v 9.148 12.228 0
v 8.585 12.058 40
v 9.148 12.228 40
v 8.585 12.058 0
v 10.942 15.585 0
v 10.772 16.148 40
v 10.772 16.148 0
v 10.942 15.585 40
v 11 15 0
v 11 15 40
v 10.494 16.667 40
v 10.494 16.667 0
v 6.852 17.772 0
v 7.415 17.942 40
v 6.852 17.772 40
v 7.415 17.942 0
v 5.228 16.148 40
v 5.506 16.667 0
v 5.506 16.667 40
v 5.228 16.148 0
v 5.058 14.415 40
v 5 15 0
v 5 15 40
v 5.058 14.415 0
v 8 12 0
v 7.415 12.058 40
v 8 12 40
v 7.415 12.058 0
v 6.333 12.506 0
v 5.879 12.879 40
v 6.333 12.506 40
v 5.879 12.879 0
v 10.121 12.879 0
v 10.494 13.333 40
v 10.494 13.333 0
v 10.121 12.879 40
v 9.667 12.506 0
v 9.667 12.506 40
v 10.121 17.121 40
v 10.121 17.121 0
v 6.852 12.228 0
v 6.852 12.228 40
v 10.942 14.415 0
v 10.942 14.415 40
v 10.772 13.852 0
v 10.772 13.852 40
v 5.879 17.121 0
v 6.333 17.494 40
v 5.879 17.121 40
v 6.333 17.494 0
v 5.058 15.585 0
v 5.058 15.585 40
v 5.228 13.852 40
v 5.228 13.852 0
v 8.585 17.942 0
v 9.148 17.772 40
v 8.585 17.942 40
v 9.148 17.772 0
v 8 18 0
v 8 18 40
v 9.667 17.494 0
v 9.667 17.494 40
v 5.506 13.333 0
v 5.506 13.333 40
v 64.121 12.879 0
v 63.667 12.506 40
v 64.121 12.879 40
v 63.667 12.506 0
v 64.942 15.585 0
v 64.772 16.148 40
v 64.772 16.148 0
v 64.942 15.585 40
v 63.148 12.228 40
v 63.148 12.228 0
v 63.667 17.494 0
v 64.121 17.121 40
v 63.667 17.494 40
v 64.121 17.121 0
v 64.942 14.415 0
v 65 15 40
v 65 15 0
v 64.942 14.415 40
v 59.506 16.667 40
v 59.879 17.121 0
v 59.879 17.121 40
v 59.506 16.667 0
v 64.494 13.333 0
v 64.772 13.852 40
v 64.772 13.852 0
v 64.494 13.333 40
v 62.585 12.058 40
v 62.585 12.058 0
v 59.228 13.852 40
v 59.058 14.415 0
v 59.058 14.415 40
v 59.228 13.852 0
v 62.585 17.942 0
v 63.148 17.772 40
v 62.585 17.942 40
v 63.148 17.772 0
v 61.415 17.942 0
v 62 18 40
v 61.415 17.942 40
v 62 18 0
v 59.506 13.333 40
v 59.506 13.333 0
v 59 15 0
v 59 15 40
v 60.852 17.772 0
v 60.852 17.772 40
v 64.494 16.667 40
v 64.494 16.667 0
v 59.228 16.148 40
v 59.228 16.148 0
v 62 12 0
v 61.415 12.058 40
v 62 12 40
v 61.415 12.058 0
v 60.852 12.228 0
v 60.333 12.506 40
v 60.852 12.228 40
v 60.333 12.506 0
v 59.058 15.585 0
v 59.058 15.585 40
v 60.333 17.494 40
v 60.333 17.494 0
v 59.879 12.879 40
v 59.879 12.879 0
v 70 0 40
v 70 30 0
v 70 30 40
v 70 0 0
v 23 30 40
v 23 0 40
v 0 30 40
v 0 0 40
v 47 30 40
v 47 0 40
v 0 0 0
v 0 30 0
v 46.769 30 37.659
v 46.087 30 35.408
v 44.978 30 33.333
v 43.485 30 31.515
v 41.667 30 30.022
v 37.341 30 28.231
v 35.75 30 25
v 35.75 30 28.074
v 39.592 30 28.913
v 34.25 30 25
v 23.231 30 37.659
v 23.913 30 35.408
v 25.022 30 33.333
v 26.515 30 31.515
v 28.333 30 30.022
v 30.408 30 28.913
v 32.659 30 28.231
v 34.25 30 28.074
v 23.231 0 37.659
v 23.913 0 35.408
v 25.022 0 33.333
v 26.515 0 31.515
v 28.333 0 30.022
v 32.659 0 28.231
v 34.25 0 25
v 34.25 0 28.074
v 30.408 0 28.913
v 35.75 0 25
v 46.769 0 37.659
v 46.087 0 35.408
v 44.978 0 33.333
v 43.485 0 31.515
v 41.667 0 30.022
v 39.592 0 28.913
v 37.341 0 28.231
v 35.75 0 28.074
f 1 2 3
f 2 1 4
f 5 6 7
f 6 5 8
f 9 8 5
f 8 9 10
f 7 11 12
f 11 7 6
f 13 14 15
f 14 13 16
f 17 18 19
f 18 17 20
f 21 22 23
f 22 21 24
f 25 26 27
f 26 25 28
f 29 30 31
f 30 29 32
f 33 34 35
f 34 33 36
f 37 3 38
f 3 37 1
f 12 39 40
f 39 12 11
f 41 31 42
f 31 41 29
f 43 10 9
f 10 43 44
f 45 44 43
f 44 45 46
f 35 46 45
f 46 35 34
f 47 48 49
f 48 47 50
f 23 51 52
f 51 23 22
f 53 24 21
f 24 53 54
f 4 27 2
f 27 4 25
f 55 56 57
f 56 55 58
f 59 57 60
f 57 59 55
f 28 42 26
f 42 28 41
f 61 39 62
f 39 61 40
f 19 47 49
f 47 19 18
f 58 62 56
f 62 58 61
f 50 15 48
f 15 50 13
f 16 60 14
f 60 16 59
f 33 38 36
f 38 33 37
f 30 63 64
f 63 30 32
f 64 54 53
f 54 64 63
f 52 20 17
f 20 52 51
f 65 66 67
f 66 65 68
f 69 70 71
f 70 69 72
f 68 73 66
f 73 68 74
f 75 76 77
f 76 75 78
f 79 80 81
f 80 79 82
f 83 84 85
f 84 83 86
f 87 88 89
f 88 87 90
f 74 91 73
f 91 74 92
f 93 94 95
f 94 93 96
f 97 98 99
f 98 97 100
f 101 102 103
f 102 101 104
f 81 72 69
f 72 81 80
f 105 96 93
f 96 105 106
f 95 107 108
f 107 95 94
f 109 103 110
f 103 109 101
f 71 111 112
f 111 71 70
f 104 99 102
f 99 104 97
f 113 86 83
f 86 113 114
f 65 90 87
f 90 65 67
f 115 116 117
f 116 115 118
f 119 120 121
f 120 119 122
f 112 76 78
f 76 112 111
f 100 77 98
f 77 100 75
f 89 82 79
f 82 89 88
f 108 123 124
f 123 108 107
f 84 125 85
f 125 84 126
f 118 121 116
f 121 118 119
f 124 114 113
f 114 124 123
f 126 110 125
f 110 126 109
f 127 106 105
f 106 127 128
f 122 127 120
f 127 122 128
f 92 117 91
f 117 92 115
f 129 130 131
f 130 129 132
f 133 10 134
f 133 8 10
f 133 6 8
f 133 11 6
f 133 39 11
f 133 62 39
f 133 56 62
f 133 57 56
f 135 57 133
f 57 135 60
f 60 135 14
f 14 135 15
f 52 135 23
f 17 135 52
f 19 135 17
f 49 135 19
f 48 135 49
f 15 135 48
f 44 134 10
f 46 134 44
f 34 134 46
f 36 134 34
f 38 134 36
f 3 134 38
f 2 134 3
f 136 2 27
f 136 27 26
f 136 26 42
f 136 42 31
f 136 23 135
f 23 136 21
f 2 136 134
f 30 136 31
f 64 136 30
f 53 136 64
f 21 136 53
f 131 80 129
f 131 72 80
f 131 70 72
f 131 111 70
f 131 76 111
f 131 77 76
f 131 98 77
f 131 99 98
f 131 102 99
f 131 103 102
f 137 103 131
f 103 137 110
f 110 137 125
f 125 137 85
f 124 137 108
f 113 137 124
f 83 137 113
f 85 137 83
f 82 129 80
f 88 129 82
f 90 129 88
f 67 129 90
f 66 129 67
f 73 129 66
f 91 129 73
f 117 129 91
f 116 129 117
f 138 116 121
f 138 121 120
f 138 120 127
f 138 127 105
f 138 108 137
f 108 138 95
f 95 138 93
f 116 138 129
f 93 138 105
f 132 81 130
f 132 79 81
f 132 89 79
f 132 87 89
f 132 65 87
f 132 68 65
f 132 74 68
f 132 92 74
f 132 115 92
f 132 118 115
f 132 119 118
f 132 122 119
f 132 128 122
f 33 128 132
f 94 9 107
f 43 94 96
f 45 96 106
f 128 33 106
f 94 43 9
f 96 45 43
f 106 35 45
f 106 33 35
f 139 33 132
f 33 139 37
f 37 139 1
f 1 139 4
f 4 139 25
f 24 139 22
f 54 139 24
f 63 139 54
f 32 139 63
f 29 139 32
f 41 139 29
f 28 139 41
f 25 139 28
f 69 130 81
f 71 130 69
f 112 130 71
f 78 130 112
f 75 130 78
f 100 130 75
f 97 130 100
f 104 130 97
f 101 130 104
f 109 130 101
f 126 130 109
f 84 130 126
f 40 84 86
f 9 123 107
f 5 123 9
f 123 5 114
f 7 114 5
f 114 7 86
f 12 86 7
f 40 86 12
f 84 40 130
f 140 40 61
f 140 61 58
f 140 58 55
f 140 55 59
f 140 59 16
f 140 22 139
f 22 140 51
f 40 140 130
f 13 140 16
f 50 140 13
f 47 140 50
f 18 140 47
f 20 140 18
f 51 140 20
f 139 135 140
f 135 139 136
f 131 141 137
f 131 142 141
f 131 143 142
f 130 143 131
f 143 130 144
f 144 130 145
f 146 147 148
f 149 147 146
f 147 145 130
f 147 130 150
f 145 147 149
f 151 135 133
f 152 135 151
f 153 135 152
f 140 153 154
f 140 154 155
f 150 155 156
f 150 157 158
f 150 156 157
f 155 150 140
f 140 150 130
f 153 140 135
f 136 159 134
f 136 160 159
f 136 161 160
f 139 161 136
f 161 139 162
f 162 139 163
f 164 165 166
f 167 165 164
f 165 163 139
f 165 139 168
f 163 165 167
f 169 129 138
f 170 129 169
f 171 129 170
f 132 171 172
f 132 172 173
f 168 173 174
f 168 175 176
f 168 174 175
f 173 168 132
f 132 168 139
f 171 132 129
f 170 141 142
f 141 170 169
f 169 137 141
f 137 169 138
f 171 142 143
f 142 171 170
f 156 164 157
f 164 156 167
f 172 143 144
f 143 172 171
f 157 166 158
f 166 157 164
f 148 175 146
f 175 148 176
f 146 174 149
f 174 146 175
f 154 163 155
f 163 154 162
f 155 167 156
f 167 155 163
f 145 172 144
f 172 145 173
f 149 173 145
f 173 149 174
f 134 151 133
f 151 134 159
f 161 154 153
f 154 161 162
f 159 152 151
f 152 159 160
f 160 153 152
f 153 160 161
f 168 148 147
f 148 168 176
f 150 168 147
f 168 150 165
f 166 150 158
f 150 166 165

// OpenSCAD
$fn = 32;

// ----------------------------------------------------------------------
// Saddle clamp: split shaft clamp
// ----------------------------------------------------------------------

// --- parameters (mm) ---
blk_l = 70;               // block length, X
blk_w = 30;               // block width, Y
blk_h = 40;               // block height
clamp_r = 12;             // shaft groove radius
hole_r = 3;               // bolt hole radius
hole_m = 8;               // bolt hole margin from the ends
saw_w = 1.5;              // saw kerf width

saw_depth = clamp_r + 3;  // saw kerf depth

difference() {
  cube([blk_l, blk_w, blk_h]);
  translate([blk_l / 2, -1, blk_h])
    rotate([-90, 0, 0])
      cylinder(h = blk_w + 2, r = clamp_r);
  for (sx = [0, 1])
    translate([sx ? blk_l - hole_m : hole_m, blk_w / 2, -1])
      cylinder(r = hole_r, h = blk_h + 2);
  translate([blk_l / 2 - saw_w / 2, -1, blk_h - saw_depth])
    cube([saw_w, blk_w + 2, saw_depth + 1]);
}
